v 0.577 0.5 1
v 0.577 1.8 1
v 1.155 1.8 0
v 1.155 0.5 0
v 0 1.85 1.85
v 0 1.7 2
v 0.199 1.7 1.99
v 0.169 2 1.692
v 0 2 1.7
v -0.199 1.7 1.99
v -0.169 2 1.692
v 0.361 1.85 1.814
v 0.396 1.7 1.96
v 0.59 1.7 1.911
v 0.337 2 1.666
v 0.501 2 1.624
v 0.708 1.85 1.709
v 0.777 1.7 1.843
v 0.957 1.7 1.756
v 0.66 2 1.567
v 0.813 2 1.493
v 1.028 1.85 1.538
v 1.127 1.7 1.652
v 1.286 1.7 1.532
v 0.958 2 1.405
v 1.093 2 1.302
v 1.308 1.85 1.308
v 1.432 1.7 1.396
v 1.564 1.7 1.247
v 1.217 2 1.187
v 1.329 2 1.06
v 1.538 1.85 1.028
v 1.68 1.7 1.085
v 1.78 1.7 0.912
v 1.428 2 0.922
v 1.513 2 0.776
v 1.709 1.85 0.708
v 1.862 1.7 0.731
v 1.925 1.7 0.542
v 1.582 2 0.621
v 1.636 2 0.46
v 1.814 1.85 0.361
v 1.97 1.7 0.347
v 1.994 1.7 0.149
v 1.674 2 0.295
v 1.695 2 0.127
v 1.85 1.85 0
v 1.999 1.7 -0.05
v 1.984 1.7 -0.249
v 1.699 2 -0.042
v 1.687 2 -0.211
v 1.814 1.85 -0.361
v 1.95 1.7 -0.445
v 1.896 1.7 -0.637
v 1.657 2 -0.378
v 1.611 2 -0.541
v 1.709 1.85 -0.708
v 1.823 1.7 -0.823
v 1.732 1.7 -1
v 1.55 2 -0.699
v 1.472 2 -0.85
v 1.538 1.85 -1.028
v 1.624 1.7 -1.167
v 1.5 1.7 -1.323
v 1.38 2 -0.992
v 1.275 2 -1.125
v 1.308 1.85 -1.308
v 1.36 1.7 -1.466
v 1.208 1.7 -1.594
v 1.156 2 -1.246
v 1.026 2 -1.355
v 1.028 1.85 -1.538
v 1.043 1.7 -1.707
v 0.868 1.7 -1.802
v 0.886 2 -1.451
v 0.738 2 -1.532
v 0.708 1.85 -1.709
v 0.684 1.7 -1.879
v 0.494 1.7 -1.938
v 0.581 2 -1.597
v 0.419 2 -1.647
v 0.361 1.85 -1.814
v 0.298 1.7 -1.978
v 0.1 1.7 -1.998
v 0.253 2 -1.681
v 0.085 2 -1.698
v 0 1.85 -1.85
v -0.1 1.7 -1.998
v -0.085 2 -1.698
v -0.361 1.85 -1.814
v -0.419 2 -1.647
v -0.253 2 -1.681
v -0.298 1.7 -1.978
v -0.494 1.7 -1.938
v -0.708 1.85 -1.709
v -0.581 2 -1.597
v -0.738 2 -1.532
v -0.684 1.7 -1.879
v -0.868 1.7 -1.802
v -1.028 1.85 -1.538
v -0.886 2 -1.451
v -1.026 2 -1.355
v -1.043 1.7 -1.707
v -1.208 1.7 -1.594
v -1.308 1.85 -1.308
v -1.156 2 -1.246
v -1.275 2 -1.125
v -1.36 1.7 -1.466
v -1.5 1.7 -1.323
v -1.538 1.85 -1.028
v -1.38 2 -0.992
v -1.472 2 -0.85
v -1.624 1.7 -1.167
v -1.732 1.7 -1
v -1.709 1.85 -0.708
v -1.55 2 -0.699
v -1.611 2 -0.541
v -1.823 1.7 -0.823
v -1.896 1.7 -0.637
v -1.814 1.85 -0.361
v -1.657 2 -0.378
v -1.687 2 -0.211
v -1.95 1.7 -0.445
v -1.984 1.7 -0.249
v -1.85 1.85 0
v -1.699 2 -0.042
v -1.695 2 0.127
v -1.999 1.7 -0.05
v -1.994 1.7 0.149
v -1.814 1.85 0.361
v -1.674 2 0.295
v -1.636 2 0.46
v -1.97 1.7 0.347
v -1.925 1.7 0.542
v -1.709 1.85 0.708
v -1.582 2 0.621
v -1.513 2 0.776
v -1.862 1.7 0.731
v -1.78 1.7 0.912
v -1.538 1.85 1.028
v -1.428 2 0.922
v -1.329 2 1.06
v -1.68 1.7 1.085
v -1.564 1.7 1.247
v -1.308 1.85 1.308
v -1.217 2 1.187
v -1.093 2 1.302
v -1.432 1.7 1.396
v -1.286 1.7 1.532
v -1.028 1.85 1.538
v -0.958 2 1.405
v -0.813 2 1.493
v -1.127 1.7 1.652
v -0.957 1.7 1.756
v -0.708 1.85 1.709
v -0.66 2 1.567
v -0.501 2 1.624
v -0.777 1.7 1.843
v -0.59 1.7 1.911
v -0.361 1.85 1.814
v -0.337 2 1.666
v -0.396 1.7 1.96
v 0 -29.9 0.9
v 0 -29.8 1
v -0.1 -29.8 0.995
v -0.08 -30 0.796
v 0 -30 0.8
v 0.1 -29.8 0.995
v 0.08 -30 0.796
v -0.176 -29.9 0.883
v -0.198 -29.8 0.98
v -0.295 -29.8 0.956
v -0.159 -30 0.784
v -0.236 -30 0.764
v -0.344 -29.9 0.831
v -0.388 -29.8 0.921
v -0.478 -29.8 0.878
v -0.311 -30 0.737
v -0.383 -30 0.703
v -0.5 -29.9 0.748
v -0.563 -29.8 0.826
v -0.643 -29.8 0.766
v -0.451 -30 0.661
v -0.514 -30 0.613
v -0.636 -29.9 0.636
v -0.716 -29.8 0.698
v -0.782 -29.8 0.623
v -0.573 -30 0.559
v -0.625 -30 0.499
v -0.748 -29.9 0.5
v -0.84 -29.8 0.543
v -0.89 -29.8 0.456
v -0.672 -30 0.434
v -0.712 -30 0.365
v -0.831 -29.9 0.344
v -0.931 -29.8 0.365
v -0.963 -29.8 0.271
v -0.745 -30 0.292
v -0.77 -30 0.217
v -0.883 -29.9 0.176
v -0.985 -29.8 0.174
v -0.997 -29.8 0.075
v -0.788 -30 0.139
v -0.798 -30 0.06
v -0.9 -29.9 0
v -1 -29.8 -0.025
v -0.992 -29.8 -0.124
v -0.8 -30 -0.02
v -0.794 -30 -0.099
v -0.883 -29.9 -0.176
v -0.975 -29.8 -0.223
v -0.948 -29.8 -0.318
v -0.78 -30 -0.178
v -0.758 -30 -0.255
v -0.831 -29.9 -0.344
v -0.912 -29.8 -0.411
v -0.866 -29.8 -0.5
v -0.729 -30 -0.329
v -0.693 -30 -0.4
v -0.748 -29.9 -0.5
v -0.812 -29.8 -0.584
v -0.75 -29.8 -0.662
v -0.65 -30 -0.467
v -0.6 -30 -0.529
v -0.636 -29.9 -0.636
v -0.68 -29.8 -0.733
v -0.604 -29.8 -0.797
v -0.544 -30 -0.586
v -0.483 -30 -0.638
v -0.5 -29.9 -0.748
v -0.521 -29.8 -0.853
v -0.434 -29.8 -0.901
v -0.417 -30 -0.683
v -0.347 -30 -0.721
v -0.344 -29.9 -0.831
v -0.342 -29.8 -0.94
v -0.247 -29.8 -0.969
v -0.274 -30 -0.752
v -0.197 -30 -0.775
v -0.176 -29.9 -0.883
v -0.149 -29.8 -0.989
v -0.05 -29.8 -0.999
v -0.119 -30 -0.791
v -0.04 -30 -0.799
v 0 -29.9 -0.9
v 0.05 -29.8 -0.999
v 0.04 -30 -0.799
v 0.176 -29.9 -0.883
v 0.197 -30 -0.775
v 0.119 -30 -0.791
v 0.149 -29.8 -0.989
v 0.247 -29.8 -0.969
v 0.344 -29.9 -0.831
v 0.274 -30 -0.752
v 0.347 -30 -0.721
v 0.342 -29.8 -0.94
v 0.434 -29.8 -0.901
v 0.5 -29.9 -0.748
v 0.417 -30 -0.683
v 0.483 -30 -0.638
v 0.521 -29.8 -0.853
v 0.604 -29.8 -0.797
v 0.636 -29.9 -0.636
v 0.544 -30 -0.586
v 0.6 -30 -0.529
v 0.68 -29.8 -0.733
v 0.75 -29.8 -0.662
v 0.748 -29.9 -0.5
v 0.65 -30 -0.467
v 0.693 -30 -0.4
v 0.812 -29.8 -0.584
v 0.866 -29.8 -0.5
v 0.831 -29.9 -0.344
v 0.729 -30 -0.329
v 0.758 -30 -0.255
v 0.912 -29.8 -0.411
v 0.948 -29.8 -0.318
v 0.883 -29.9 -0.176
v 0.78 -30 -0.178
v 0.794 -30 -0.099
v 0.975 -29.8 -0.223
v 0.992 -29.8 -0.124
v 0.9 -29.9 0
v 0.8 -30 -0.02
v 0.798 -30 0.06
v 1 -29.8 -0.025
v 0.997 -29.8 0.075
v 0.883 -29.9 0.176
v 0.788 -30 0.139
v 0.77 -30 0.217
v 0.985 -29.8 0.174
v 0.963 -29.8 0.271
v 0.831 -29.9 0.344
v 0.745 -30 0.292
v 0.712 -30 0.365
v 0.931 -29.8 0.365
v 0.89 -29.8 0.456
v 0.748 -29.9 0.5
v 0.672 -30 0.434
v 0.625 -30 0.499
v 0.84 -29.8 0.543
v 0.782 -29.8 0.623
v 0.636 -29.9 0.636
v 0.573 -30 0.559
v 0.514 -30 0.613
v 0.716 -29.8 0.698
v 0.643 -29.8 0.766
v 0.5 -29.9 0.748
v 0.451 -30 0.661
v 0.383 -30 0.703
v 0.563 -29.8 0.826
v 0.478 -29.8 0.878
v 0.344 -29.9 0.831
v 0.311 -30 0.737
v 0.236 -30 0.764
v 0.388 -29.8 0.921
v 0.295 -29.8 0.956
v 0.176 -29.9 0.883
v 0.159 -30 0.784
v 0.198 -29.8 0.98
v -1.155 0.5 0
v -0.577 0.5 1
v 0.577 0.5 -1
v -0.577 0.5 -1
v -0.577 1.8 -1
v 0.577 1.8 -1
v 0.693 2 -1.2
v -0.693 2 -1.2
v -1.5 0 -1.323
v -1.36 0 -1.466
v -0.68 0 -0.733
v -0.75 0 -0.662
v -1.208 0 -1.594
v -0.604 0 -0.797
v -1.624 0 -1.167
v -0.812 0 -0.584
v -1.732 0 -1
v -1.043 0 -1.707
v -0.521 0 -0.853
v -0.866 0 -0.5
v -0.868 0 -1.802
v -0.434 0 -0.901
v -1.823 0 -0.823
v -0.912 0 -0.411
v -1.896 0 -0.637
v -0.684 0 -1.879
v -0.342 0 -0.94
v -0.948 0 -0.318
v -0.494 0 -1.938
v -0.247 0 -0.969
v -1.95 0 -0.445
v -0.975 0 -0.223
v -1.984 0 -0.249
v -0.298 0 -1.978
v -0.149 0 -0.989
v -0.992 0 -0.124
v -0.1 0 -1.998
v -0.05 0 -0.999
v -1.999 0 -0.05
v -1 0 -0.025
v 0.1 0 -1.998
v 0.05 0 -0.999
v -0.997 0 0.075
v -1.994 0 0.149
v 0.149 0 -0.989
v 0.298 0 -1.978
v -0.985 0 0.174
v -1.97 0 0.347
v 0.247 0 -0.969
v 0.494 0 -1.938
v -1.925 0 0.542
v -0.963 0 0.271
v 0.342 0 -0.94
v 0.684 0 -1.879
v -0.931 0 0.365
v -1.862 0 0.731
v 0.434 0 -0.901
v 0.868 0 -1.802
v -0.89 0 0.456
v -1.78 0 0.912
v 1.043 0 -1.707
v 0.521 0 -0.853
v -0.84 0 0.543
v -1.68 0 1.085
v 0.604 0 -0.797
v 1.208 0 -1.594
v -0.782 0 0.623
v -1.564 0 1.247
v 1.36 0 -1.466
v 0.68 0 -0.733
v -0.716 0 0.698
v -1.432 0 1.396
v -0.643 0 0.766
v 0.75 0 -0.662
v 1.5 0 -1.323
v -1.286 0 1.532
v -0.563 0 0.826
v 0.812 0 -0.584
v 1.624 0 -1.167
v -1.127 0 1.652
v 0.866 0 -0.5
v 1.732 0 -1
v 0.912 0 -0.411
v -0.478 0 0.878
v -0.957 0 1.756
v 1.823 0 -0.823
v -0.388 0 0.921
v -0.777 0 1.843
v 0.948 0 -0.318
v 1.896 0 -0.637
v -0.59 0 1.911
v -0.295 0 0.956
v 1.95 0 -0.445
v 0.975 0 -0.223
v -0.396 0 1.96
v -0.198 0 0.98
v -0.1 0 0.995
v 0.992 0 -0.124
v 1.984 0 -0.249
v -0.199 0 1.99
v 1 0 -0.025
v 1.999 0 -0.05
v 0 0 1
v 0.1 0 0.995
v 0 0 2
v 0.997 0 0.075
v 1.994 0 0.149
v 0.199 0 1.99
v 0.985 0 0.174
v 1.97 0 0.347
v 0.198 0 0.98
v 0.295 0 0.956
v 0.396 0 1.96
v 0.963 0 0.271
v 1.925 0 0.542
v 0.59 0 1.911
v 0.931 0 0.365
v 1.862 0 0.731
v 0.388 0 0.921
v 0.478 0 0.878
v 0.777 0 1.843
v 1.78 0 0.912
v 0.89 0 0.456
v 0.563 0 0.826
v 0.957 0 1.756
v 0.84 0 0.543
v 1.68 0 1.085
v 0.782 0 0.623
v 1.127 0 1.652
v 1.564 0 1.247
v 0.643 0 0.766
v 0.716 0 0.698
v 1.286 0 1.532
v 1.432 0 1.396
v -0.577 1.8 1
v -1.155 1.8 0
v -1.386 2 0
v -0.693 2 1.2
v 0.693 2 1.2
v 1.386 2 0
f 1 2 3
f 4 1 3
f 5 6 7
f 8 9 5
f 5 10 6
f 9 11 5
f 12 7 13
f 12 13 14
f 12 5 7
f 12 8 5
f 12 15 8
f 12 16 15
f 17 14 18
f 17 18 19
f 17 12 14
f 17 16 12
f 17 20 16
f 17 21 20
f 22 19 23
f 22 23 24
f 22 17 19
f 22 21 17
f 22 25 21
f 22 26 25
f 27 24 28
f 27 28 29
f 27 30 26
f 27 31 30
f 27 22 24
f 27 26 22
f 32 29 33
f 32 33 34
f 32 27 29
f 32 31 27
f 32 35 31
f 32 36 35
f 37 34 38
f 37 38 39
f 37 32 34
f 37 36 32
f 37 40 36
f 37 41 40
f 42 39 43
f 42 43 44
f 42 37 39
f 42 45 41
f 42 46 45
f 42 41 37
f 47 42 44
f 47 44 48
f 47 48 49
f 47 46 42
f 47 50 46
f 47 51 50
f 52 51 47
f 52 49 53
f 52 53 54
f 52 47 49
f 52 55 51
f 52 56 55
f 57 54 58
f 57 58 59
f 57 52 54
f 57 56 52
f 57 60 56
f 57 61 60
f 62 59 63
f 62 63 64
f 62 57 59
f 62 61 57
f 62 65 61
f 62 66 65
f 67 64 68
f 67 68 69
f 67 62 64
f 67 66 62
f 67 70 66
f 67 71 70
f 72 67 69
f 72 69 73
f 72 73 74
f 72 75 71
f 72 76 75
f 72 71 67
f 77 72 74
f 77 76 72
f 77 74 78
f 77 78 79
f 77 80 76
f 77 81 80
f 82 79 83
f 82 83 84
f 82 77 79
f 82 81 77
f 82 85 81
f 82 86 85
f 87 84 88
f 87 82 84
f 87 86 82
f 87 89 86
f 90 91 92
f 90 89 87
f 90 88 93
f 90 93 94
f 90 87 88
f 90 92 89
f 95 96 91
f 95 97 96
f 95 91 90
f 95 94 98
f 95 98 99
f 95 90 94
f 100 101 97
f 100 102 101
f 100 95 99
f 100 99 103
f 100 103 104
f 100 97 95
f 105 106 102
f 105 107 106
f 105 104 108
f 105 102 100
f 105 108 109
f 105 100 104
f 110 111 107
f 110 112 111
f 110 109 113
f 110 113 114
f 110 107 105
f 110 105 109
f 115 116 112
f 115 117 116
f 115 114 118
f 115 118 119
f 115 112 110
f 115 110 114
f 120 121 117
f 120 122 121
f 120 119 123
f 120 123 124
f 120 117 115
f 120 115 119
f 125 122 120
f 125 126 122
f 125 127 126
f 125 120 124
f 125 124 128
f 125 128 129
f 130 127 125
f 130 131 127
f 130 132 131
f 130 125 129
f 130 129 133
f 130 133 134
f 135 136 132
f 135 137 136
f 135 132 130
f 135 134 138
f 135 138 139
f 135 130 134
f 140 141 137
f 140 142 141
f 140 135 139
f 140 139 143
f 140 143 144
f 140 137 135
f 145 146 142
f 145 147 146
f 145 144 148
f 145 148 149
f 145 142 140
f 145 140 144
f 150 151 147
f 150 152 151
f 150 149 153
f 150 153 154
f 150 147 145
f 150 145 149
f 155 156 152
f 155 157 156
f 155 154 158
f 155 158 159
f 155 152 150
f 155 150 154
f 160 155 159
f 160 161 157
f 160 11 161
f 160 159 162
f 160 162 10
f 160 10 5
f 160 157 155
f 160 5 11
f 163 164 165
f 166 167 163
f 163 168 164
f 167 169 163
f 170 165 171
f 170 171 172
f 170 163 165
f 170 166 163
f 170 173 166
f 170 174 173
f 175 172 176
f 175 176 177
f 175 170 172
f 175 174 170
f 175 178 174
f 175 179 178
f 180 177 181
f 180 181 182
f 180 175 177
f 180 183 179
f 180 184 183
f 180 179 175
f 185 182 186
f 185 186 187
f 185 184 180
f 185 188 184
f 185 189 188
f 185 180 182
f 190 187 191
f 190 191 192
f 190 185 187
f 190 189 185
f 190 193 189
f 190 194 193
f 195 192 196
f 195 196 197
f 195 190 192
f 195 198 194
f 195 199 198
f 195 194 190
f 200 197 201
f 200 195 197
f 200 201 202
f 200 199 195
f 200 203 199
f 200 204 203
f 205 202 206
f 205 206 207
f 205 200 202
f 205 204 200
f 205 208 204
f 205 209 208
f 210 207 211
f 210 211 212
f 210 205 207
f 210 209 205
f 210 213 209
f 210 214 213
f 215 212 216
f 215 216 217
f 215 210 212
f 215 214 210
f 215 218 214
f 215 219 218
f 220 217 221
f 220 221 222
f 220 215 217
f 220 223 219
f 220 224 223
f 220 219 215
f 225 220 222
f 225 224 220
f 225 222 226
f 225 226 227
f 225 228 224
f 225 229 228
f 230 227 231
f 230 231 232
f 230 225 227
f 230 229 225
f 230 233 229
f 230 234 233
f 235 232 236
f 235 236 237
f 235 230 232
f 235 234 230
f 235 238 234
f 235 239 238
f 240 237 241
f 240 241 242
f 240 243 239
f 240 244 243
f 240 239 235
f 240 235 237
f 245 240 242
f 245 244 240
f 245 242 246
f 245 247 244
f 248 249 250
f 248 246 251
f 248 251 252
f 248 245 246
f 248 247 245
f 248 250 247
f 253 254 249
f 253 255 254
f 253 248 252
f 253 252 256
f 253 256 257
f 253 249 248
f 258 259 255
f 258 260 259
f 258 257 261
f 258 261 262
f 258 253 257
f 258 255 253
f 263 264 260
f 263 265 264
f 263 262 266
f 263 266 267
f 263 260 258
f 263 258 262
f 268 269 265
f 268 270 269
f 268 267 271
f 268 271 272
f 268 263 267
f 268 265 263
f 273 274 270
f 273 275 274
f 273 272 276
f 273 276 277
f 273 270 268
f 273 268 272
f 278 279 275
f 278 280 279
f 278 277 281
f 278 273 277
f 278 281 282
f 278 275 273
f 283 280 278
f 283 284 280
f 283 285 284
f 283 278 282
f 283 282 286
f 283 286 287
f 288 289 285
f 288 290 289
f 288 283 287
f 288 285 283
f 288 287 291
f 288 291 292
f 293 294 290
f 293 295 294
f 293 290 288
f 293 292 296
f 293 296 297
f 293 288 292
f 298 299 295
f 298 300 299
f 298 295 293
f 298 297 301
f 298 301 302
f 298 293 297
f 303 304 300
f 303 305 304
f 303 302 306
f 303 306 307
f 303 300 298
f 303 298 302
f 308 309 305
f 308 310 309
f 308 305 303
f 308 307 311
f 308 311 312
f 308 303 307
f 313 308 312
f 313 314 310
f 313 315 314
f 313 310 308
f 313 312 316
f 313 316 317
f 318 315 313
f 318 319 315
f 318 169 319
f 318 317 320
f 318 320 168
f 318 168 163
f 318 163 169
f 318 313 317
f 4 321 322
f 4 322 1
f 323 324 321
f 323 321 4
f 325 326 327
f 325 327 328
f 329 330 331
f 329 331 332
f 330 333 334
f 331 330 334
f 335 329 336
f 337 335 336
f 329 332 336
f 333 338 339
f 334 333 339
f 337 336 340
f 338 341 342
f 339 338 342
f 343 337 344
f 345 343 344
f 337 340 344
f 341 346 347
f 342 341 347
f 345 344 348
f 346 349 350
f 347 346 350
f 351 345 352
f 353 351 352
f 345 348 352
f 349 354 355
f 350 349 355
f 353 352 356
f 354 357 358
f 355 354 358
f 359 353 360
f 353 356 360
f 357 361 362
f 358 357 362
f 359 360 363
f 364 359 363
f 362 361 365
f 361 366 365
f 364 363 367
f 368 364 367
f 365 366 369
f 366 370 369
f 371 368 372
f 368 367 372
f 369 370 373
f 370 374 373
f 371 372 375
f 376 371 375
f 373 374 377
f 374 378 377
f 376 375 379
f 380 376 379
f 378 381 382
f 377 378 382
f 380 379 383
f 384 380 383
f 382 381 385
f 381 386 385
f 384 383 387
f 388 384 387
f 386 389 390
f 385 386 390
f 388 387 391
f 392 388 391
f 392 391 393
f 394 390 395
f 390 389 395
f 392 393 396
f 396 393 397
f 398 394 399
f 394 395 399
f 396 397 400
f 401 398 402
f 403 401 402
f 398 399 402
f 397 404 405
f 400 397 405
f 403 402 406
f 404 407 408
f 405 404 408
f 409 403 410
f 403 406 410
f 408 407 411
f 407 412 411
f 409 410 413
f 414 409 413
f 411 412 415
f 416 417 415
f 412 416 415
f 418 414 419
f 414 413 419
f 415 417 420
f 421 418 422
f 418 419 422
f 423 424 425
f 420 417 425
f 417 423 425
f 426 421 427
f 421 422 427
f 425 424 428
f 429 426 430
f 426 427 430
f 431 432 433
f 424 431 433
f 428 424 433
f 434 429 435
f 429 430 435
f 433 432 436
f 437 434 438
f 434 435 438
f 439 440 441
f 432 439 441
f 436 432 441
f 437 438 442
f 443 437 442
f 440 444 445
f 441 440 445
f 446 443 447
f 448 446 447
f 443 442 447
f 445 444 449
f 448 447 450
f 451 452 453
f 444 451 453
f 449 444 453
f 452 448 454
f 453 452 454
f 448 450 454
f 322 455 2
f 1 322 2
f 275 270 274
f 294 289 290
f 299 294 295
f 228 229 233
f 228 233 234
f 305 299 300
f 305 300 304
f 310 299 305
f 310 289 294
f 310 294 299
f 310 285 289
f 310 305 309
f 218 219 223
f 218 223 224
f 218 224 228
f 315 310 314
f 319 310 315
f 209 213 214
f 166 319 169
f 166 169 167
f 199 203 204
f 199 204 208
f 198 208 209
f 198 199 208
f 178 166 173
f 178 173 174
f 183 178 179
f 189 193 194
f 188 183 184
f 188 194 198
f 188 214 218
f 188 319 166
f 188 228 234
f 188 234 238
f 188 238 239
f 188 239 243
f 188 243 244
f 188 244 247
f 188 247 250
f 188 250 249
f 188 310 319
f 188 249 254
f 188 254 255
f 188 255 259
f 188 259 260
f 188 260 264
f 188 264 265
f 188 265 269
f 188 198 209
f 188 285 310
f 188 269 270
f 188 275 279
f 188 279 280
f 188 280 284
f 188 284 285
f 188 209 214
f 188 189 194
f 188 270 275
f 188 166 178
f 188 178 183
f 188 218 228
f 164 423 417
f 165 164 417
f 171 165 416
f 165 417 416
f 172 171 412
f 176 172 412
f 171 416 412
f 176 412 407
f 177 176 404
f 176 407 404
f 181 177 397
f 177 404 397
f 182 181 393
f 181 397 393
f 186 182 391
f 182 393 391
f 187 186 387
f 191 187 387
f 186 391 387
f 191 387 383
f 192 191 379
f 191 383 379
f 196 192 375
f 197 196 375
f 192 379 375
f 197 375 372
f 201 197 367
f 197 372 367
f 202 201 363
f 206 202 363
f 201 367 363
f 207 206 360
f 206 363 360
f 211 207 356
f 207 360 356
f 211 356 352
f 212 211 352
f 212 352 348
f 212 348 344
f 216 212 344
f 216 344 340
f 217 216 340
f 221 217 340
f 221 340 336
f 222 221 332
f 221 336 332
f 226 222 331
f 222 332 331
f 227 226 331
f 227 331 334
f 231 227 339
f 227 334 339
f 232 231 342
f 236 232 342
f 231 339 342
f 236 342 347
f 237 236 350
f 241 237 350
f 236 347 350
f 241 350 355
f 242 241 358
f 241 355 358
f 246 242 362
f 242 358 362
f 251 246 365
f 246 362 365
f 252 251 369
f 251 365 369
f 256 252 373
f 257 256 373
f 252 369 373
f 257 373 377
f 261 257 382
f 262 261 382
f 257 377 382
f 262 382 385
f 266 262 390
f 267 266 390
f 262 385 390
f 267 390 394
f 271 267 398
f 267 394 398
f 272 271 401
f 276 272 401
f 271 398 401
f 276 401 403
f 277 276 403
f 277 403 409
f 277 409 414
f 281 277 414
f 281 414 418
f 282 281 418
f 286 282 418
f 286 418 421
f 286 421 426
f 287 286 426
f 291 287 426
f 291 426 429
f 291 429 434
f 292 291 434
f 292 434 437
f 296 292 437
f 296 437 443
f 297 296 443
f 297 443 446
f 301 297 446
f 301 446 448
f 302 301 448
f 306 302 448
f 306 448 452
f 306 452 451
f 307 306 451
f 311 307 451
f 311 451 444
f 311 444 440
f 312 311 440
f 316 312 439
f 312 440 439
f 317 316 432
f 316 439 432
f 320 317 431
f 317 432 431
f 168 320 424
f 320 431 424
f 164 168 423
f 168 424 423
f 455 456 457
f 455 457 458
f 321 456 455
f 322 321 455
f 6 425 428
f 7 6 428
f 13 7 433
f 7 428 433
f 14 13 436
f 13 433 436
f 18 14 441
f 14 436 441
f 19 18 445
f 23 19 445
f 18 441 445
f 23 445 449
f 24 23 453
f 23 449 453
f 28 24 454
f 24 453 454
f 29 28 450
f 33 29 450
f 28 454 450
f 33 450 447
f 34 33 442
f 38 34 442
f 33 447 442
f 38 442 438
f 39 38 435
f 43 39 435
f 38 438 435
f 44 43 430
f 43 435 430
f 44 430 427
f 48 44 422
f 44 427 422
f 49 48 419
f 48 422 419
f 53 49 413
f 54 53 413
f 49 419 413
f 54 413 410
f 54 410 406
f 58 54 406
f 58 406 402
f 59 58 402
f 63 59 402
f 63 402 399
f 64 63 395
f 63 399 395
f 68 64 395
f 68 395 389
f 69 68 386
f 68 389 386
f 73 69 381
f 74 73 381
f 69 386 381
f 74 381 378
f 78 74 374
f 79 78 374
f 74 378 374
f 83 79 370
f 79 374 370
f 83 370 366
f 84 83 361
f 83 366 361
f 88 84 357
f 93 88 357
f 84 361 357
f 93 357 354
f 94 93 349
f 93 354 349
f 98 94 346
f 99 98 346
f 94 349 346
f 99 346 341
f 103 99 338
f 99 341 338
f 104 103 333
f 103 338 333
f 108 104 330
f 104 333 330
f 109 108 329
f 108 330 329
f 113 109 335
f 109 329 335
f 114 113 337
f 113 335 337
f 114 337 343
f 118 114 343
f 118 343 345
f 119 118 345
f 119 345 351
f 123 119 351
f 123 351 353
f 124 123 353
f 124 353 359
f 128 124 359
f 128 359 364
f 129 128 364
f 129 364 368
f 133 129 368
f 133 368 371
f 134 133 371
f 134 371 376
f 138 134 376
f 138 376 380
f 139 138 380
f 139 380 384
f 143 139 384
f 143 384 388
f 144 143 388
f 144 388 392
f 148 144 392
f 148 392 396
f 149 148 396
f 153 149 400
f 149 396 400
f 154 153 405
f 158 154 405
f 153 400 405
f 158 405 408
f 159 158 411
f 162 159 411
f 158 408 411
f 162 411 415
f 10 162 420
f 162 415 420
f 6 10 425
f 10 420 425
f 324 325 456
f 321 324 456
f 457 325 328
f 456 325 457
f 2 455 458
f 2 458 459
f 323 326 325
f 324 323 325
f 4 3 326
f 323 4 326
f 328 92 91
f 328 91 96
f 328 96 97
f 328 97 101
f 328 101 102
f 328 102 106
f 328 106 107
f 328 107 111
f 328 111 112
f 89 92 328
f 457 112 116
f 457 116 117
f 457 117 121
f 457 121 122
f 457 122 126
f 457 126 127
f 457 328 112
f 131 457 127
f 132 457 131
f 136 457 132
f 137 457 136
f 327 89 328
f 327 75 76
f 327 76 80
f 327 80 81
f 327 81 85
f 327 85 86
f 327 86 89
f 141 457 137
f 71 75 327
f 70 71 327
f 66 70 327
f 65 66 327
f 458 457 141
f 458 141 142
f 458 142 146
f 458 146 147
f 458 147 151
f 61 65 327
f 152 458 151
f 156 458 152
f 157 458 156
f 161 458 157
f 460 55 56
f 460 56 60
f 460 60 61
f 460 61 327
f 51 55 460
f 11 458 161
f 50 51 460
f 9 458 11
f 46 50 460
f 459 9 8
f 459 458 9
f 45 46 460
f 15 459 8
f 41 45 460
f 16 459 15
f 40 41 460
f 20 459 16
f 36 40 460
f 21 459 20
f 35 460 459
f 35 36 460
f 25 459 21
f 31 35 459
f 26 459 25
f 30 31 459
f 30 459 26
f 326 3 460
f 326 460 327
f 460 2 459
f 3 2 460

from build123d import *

# Parameters (mm, degrees)
SKETCH1_R           = 2
BOSS_EXTRUDE1_DEPTH = 2
CHAMFER1_SIZE       = 0.3
CUT_EXTRUDE1_DEPTH  = 1.5
CHAMFER2_SIZE       = 0.2
SKETCH3_R           = 1
BOSS_EXTRUDE2_DEPTH = 30
CHAMFER3_SIZE       = 0.2


with BuildPart() as part:
    # Sketch1 → Boss-Extrude1 (new body)
    with BuildSketch(Plane(origin=(0, 0, 0), x_dir=(1, 0, 0), z_dir=(0, 1, 0))):
        with Locations(Location((0, 0, 0), (0, 0, 270))):  # turned: the seam where the file's is
            Circle(SKETCH1_R)
    extrude(amount=BOSS_EXTRUDE1_DEPTH)

    # Chamfer1
    chamfer1_edges = [part.edges().sort_by_distance(p)[0] for p in [
        (0, 2, -2),
    ]]
    chamfer(chamfer1_edges, length=CHAMFER1_SIZE)

    # Sketch2 → Cut-Extrude1 (cut)
    with BuildSketch(Plane(origin=(0, 2, 0), x_dir=(1, 0, 0), z_dir=(0, 1, 0))):
        Polygon((1.154700538, 0), (0.577350269, 1), (-0.577350269, 1), (-1.154700538, 0), (-0.577350269, -1), (0.577350269, -1), align=None)
    extrude(amount=-CUT_EXTRUDE1_DEPTH, mode=Mode.SUBTRACT)

    # Chamfer2
    chamfer2_edges = [part.edges().sort_by_distance(p)[0] for p in [
        (0.866025404, 2, 0.5),
        (0.866025404, 2, -0.5),
        (0, 2, -1),
        (-0.866025404, 2, -0.5),
        (-0.866025404, 2, 0.5),
        (0, 2, 1),
    ]]
    chamfer(chamfer2_edges, length=CHAMFER2_SIZE)

    # Sketch3 → Boss-Extrude2 (add)
    with BuildSketch(Plane.XZ):
        with Locations(Location((0, 0, 0), (0, 0, 90))):  # turned: the seam where the file's is
            Circle(SKETCH3_R)
    extrude(amount=BOSS_EXTRUDE2_DEPTH)

    # Chamfer3
    chamfer3_edges = [part.edges().sort_by_distance(p)[0] for p in [
        (0, -30, -1),
    ]]
    chamfer(chamfer3_edges, length=CHAMFER3_SIZE)


solid = part.part
